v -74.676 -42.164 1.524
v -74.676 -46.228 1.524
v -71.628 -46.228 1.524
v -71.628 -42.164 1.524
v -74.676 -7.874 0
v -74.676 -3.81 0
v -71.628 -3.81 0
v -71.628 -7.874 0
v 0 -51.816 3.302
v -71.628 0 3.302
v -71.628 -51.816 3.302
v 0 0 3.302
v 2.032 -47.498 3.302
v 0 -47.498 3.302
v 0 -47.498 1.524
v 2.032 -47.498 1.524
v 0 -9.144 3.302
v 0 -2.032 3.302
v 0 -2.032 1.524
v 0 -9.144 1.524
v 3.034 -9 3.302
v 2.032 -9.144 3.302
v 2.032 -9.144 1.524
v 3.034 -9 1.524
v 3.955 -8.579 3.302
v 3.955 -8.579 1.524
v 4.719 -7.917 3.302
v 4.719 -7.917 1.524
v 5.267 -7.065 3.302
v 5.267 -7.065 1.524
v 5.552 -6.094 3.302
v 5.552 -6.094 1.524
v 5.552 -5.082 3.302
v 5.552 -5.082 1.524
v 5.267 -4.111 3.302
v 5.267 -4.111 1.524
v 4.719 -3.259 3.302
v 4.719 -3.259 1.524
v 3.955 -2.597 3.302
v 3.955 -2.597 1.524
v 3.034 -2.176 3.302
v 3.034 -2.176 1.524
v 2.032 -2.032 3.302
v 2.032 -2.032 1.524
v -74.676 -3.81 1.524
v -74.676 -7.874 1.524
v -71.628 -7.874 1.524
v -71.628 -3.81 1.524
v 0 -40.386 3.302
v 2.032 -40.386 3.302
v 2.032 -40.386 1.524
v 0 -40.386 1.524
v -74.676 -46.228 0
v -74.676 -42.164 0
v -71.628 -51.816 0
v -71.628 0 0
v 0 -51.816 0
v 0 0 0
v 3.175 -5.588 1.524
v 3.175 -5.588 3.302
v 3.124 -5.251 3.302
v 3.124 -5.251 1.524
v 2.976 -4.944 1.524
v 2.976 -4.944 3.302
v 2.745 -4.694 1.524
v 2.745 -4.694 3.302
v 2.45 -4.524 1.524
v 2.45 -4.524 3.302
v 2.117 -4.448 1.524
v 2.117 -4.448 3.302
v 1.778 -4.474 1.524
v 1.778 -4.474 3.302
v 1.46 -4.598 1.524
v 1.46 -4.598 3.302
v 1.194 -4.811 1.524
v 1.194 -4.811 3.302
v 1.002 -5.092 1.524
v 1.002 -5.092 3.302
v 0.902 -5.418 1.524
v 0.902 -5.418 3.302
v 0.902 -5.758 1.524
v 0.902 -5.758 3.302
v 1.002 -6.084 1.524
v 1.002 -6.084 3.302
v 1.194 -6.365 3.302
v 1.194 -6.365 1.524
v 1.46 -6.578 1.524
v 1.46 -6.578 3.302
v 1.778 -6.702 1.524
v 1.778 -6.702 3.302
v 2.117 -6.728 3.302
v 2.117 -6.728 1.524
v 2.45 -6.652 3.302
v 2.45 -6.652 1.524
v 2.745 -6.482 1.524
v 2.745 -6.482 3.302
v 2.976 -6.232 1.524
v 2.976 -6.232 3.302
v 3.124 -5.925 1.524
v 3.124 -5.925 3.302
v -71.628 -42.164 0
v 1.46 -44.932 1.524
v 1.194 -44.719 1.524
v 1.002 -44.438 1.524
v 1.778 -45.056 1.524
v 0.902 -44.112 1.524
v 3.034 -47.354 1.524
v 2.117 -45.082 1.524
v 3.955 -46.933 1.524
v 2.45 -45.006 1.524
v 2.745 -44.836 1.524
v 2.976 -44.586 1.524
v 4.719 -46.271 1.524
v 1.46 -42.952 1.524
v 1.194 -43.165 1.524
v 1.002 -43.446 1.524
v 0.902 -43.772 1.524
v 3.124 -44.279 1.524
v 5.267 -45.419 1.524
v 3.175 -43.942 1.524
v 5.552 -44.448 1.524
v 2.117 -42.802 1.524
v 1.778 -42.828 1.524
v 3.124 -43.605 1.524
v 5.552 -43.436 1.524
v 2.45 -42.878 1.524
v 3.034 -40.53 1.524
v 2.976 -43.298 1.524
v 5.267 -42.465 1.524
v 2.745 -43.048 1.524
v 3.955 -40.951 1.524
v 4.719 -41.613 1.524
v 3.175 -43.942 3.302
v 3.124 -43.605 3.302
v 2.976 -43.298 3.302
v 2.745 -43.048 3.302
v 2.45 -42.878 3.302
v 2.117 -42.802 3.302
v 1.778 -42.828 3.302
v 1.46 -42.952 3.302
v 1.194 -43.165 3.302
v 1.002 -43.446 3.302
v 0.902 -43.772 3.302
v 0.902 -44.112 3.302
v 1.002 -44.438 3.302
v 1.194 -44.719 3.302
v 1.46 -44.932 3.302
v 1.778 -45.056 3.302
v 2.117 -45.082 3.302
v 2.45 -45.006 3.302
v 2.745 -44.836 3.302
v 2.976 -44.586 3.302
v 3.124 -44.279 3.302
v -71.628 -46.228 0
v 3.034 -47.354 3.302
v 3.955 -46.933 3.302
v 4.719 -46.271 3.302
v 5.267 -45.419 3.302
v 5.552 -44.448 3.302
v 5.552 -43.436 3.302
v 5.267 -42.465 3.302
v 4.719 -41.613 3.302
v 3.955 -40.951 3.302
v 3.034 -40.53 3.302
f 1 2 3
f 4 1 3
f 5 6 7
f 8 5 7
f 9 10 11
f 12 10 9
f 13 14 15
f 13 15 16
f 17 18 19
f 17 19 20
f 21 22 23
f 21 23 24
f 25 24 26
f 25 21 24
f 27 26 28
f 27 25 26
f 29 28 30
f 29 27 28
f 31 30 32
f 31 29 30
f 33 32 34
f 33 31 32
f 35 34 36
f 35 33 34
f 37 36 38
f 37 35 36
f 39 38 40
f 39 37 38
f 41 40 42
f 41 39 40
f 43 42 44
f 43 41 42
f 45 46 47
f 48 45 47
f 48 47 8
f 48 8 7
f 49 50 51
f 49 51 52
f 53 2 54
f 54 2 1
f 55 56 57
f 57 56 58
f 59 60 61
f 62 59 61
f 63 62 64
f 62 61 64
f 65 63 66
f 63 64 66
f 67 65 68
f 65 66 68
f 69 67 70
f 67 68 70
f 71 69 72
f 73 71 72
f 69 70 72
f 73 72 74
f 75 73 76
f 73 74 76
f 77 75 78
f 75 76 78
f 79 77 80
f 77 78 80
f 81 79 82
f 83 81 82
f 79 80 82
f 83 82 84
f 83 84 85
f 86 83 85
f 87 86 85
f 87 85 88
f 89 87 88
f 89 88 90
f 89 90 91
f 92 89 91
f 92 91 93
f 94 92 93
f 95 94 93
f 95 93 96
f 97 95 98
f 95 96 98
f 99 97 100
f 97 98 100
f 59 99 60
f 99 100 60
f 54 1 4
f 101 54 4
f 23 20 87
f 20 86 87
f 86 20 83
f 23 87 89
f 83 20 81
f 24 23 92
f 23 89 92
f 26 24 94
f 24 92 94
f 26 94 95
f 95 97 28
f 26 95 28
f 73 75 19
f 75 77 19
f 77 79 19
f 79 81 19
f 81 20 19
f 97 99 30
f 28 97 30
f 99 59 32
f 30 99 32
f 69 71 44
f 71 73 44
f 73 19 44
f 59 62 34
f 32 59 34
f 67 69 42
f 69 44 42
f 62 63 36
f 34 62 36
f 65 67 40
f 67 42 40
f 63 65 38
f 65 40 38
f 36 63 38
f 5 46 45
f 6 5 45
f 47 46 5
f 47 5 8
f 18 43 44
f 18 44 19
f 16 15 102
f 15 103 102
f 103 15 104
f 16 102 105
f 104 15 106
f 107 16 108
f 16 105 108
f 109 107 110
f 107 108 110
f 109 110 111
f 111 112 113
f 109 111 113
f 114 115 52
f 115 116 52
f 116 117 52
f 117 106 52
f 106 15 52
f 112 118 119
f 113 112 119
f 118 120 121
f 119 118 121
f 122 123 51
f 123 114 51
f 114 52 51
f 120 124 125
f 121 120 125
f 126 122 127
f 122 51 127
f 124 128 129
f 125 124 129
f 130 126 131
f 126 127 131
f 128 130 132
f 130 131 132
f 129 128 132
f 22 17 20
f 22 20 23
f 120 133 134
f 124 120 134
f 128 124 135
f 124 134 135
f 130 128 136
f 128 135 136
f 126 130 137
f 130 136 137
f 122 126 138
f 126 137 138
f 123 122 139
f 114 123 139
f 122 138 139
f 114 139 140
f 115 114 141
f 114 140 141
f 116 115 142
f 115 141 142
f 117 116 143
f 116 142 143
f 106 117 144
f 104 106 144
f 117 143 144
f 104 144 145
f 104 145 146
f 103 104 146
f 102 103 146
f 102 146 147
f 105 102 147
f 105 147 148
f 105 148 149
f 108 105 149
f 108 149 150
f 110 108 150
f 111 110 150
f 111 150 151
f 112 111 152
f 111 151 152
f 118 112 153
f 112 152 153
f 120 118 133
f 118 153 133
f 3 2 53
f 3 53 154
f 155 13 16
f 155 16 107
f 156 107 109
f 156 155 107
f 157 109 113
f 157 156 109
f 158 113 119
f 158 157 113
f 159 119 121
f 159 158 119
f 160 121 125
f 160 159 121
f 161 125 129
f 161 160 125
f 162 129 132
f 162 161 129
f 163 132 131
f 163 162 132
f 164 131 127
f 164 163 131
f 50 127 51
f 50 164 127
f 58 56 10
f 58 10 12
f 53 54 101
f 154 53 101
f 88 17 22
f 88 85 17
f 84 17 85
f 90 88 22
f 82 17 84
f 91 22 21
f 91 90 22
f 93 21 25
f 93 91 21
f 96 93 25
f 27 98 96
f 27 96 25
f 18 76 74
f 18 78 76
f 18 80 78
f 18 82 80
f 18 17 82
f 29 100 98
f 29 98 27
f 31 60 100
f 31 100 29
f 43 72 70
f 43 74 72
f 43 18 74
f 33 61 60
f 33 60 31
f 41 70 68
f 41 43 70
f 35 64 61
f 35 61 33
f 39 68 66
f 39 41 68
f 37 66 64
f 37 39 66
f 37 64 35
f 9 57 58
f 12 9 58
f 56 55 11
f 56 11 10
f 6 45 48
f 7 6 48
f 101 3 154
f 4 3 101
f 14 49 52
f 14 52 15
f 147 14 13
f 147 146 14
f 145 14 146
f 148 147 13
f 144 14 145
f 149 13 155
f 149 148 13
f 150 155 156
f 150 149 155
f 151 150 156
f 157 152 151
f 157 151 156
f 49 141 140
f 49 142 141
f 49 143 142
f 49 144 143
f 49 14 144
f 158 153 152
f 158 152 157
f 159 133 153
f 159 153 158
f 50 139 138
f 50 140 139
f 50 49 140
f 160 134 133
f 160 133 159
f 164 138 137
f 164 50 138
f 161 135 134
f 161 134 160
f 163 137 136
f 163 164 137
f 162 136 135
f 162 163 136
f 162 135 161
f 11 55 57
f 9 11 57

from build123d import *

# Parameters (mm, degrees)
F0_W     = 71.628
F0_H     = 51.816
F1_DEPTH = 3.302
F2_R     = 1.143
F3_DEPTH = 1.778
F4_W     = 3.048
F4_H     = 4.064
F5_DEPTH = 3.302
F6_W     = 3.048
F6_H     = 1.778
F7_DEPTH = 101.6


with BuildPart() as f1:
    # F0 (on Top) → F1 (new body)
    with BuildSketch(Plane.XY):
        with Locations((-35.814, -25.908)):
            Rectangle(F0_W, F0_H)
    extrude(amount=F1_DEPTH)


with BuildPart() as f3:
    # F2 (on face) → F3 (new body)
    with BuildSketch(Plane.XY.offset(3.302)):
        with BuildLine():
            Line((2.032, -2.032), (0, -2.032))
            Line((0, -2.032), (0, -9.144))
            Line((0, -9.144), (2.032, -9.144))
            ThreePointArc((2.032, -9.144), (5.588, -5.588), (2.032, -2.032))
        make_face()
        with Locations((2.032, -5.588)):
            Circle(F2_R, mode=Mode.SUBTRACT)
        with BuildLine():
            ThreePointArc((2.032, -47.498), (5.588, -43.942), (2.032, -40.386))
            Line((2.032, -40.386), (0, -40.386))
            Line((0, -40.386), (0, -47.498))
            Line((0, -47.498), (2.032, -47.498))
        make_face()
        with Locations((2.032, -43.942)):
            Circle(F2_R, mode=Mode.SUBTRACT)
    extrude(amount=-F3_DEPTH)


with BuildPart() as f5:
    # F4 (on face) → F5 (new body)
    with BuildSketch(Plane.XY.offset(3.302)):
        with Locations((-73.152, -5.842)):
            Rectangle(F4_W, F4_H)
        with Locations((-73.152, -44.196)):
            Rectangle(F4_W, F4_H)
    extrude(amount=-F5_DEPTH)

    # F6 (on face) → F7 (cut)
    with BuildSketch(Plane.XZ.offset(46.228)):
        with Locations((-73.152, 2.413)):
            Rectangle(F6_W, F6_H)
    extrude(amount=-F7_DEPTH, mode=Mode.SUBTRACT)


solid = Compound([f1.part, f3.part, f5.part])
